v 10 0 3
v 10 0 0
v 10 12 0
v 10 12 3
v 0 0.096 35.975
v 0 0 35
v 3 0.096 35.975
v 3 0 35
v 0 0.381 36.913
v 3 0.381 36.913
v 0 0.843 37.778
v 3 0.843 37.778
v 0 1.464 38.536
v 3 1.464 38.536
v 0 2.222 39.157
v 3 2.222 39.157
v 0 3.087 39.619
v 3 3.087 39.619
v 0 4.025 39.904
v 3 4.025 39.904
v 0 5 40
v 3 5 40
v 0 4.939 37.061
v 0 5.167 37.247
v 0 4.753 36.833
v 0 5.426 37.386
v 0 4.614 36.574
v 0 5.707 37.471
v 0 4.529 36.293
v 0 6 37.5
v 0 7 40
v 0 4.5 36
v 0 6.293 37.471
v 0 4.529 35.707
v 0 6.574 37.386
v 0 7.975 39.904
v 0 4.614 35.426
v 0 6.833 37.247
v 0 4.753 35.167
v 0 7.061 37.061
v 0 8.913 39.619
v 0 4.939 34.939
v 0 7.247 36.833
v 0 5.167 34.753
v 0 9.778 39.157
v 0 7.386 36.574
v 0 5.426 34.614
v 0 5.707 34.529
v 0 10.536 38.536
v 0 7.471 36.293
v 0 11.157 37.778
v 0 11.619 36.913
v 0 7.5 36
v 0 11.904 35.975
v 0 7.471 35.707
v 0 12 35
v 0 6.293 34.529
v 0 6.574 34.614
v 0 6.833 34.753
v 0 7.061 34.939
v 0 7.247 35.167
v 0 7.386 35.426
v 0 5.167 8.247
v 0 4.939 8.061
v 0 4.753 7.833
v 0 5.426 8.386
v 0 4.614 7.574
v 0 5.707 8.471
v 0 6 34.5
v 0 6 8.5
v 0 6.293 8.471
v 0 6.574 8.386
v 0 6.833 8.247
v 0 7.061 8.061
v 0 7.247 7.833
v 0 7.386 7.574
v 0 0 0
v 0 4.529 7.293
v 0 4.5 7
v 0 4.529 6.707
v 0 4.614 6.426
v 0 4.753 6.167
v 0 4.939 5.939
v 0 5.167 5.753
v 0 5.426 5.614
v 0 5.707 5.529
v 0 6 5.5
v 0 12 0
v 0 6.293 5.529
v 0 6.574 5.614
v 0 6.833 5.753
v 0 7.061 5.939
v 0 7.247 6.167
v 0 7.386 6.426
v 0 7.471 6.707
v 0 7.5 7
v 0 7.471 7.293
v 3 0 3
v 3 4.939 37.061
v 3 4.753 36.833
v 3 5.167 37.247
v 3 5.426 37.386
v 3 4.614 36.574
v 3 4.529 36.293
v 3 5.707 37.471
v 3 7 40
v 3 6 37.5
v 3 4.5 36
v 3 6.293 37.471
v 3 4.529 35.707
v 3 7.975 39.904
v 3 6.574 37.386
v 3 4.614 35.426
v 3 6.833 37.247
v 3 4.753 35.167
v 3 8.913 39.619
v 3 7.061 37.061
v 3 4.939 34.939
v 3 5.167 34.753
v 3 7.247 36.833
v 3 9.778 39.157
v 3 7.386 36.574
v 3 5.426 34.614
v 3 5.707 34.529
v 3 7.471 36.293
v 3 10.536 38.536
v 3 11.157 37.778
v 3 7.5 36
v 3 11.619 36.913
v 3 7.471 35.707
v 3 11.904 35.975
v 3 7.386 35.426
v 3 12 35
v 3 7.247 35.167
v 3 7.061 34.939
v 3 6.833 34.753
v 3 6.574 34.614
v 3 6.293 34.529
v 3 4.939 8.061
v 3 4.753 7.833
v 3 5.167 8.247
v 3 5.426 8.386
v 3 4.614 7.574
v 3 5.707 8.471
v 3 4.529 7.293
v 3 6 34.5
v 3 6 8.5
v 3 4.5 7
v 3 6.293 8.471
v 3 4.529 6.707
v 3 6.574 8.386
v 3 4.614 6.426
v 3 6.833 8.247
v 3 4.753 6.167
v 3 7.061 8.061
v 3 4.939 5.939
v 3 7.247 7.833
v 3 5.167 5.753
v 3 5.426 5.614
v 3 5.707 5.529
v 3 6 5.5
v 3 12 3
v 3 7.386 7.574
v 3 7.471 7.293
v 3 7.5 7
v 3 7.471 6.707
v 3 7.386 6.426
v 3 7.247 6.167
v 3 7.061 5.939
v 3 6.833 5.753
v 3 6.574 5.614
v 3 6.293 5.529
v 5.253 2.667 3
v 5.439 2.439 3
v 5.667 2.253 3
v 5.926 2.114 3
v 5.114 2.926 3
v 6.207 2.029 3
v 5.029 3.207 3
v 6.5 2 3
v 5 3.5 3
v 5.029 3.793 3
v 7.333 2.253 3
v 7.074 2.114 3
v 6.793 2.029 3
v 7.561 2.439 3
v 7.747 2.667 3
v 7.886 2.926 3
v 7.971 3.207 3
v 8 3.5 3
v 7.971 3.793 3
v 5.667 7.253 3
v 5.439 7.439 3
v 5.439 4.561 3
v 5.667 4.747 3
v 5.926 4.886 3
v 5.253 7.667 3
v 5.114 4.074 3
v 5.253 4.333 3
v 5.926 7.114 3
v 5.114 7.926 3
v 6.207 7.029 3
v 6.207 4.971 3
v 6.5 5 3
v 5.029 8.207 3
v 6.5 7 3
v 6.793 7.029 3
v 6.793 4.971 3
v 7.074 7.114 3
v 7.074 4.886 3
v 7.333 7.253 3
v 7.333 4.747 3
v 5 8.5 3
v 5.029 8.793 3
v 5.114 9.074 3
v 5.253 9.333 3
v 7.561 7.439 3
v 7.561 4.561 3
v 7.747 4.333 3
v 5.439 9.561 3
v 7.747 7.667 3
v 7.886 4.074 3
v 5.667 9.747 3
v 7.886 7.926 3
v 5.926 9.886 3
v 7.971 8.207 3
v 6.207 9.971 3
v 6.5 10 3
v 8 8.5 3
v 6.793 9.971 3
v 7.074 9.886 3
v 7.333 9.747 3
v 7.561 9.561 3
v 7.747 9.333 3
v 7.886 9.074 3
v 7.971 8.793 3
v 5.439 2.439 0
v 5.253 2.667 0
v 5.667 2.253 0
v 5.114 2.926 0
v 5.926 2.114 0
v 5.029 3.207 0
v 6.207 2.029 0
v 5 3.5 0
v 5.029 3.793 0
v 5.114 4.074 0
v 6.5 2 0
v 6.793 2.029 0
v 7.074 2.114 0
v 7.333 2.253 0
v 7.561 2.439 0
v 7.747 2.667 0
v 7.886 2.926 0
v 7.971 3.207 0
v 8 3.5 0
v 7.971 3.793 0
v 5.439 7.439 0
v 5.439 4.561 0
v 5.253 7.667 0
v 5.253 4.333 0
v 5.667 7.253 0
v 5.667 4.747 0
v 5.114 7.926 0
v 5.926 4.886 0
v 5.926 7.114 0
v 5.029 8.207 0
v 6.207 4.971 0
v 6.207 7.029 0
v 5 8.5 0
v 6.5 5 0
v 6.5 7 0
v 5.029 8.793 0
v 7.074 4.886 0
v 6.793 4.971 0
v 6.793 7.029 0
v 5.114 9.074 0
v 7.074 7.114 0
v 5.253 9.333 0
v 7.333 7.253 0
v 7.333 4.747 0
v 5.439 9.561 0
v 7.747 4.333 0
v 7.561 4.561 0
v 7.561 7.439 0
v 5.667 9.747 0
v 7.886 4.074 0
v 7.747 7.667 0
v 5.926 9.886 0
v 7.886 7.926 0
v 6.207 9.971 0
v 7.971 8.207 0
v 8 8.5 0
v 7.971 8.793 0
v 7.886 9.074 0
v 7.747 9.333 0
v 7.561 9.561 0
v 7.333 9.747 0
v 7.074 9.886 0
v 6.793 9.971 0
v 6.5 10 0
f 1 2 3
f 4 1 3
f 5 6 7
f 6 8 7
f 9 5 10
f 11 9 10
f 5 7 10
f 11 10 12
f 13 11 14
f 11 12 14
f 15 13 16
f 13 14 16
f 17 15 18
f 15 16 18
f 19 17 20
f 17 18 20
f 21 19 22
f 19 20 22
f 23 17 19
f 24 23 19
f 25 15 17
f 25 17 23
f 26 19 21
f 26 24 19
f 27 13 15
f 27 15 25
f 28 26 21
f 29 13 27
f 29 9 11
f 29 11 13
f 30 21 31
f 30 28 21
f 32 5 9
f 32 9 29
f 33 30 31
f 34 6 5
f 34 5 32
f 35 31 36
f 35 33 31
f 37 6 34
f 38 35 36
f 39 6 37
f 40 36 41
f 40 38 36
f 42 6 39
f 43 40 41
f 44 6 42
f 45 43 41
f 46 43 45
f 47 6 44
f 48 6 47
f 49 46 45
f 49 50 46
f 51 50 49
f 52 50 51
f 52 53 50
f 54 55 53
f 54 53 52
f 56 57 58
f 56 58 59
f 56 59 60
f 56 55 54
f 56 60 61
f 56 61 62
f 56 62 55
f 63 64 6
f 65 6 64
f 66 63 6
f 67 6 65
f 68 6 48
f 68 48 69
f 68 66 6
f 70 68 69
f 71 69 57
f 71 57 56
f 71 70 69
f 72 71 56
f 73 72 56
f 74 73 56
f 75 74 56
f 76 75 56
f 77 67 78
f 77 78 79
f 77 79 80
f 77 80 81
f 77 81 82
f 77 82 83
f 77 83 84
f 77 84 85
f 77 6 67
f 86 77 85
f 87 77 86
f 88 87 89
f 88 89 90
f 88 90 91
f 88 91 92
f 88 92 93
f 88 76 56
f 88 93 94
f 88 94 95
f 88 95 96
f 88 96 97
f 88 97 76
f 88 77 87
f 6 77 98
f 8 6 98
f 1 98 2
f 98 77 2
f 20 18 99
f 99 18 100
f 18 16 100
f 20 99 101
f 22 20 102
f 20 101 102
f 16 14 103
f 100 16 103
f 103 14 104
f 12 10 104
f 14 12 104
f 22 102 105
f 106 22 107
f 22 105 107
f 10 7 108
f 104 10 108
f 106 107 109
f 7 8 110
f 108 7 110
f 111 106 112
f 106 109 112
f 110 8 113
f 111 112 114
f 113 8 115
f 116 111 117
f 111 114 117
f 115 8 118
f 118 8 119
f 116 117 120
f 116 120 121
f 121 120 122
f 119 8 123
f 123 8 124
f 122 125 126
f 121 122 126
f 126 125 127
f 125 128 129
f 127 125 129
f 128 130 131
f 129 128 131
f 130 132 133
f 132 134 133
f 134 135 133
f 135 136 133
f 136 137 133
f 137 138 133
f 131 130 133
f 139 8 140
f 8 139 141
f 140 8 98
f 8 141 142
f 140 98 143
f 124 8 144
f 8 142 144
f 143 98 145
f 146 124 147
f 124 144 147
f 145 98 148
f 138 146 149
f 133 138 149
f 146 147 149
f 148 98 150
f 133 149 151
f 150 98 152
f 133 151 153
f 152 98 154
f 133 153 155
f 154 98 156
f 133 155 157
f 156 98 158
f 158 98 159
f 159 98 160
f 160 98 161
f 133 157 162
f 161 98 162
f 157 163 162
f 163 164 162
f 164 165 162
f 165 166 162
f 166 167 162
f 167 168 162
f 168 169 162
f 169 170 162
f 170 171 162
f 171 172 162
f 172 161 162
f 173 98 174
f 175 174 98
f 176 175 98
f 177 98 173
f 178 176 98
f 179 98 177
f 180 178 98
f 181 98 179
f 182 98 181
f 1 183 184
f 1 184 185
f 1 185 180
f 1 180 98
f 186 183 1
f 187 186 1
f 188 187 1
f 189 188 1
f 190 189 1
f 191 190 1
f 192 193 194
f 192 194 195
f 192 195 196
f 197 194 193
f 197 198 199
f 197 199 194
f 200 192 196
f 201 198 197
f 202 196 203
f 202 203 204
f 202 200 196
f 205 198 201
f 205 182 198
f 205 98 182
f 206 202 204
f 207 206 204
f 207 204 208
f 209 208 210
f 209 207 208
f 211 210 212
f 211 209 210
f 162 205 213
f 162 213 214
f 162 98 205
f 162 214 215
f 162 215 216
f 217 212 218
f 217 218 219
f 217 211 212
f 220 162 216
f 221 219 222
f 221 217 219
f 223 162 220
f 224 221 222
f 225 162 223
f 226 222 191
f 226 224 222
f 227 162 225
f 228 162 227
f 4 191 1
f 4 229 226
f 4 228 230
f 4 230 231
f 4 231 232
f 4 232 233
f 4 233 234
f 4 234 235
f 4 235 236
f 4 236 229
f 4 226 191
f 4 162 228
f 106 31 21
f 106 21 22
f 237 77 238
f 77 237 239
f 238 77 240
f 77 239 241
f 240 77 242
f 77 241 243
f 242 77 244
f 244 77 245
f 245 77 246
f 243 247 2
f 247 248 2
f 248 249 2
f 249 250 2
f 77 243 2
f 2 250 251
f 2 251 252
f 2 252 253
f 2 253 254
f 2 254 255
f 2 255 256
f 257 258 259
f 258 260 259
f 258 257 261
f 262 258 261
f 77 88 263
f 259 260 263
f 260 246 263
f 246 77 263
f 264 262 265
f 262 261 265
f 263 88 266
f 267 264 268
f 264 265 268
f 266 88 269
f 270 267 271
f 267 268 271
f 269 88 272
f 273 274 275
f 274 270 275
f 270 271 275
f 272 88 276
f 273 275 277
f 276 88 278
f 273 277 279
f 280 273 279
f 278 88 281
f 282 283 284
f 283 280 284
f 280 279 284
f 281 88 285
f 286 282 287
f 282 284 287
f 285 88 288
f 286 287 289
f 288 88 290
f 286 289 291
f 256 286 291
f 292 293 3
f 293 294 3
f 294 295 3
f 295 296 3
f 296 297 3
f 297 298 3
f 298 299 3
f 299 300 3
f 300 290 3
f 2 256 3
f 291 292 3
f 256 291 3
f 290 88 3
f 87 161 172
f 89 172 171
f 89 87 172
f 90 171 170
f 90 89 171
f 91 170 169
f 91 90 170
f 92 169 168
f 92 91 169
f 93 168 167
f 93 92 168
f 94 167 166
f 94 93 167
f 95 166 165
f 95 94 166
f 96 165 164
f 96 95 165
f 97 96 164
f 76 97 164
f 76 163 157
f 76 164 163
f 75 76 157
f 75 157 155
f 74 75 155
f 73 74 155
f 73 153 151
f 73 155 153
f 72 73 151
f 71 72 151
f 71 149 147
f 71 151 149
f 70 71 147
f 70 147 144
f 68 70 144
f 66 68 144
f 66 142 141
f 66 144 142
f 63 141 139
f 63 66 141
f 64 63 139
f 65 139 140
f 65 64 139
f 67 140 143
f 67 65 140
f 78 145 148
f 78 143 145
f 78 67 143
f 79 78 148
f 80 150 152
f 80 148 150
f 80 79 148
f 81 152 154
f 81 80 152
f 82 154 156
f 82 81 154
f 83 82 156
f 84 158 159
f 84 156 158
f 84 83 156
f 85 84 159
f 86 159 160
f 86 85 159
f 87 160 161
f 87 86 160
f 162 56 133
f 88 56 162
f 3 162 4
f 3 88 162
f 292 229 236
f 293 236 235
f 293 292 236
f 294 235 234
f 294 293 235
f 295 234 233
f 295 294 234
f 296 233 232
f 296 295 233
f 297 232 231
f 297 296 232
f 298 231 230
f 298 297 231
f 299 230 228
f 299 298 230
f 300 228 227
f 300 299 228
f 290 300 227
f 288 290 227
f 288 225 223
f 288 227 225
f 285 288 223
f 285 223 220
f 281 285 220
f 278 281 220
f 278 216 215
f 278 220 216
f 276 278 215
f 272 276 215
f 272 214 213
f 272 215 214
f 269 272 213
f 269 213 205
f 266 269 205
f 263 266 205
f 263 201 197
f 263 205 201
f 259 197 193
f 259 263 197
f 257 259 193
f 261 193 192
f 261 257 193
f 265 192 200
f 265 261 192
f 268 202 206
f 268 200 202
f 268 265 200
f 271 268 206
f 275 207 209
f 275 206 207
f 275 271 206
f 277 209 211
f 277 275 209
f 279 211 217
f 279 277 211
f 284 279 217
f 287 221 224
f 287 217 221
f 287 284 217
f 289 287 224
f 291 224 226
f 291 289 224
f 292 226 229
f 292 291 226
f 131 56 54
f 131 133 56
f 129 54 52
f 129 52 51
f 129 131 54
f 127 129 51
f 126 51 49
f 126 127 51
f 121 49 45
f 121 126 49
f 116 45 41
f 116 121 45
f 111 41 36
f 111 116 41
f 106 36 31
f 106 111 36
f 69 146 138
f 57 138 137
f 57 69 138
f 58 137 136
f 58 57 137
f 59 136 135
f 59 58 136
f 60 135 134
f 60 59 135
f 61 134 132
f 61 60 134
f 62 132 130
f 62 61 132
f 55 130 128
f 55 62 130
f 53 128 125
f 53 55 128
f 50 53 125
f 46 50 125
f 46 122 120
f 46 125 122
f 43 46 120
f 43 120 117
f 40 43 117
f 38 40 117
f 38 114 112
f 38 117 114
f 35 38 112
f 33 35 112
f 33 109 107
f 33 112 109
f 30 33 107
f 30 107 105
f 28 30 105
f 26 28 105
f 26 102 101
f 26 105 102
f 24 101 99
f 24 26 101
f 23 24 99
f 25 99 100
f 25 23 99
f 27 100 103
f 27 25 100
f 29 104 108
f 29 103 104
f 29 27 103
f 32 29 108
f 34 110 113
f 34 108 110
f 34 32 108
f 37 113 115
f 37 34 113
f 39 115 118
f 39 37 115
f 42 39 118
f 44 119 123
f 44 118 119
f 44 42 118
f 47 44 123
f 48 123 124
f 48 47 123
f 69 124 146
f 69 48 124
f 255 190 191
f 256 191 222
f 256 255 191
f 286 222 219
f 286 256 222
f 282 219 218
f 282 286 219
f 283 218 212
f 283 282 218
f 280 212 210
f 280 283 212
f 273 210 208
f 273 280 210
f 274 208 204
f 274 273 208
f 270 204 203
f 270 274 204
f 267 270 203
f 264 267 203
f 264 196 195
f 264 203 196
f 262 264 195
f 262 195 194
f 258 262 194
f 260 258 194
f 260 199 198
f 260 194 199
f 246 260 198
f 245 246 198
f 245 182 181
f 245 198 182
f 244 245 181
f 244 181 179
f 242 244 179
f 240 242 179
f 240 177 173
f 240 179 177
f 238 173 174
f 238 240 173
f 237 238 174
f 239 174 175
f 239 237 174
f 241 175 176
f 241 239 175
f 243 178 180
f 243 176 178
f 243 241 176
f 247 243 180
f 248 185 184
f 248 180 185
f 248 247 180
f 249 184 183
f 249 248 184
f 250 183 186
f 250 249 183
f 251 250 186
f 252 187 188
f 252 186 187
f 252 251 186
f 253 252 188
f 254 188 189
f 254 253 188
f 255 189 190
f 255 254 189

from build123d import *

# Parameters (mm, degrees)
CYLINDER003_R           = 1.5
CYLINDER003_DEPTH       = 10
CYLINDER003_PITCH_ANGLE = 90
CYLINDER002_R           = 1.5
CYLINDER002_DEPTH       = 10
CYLINDER002_PITCH_ANGLE = 90
BOX001_W                = 3
BOX001_H                = 12
BOX001_DEPTH            = 40
FILLET_R                = 5
CYLINDER001_R           = 1.5
CYLINDER001_DEPTH       = 10
CYLINDER_R              = 1.5
CYLINDER_DEPTH          = 10
BOX_W                   = 10
BOX_H                   = 12
BOX_DEPTH               = 3


with BuildPart() as cylinder003:
    # Cylinder003 → Cylinder003 (new body)
    with BuildSketch(Plane.XY):
        Circle(CYLINDER003_R)
    extrude(amount=CYLINDER003_DEPTH)


with BuildPart() as cylinder003_1:
    # Cylinder003 pitch: moved
    add(cylinder003.part.rotate(Axis((0, 0, 0), (0, 1, 0)), CYLINDER003_PITCH_ANGLE))


with BuildPart() as cylinder003_2:
    # Cylinder003 placement: moved
    add(cylinder003_1.part.moved(Location((0, 6, 36))))


with BuildPart() as cylinder002:
    # Cylinder002 → Cylinder002 (new body)
    with BuildSketch(Plane.XY):
        Circle(CYLINDER002_R)
    extrude(amount=CYLINDER002_DEPTH)


with BuildPart() as cylinder002_1:
    # Cylinder002 pitch: moved
    add(cylinder002.part.rotate(Axis((0, 0, 0), (0, 1, 0)), CYLINDER002_PITCH_ANGLE))


with BuildPart() as cylinder002_2:
    # Cylinder002 placement: moved
    add(cylinder002_1.part.moved(Location((0, 6, 7))))


with BuildPart() as cut003:
    # Box001 → Box001 (new body)
    with BuildSketch(Plane.XY):
        with Locations((1.5, 6)):
            Rectangle(BOX001_W, BOX001_H)
    extrude(amount=BOX001_DEPTH)

    # Fillet
    fillet_edges = [cut003.edges().sort_by_distance(p)[0] for p in [
        (1.5, 0, 40),
        (1.5, 12, 40),
    ]]
    fillet(fillet_edges, radius=FILLET_R)

    # Cut002: cut Cylinder002
    add(cylinder002_2.part, mode=Mode.SUBTRACT)

    # Cut003: cut Cylinder003
    add(cylinder003_2.part, mode=Mode.SUBTRACT)


with BuildPart() as cylinder001:
    # Cylinder001 → Cylinder001 (new body)
    with BuildSketch(Plane(origin=(6.5, 8.5, 0), x_dir=(1, 0, 0), z_dir=(0, 0, 1))):
        Circle(CYLINDER001_R)
    extrude(amount=CYLINDER001_DEPTH)


with BuildPart() as cylinder:
    # Cylinder → Cylinder (new body)
    with BuildSketch(Plane(origin=(6.5, 3.5, 0), x_dir=(1, 0, 0), z_dir=(0, 0, 1))):
        Circle(CYLINDER_R)
    extrude(amount=CYLINDER_DEPTH)


with BuildPart() as fusion:
    # Box → Box (new body)
    with BuildSketch(Plane.XY):
        with Locations((5, 6)):
            Rectangle(BOX_W, BOX_H)
    extrude(amount=BOX_DEPTH)

    # Cut: cut Cylinder
    add(cylinder.part, mode=Mode.SUBTRACT)

    # Cut001: cut Cylinder001
    add(cylinder001.part, mode=Mode.SUBTRACT)

    # Fusion: union Cut003
    add(cut003.part)


solid = fusion.part
